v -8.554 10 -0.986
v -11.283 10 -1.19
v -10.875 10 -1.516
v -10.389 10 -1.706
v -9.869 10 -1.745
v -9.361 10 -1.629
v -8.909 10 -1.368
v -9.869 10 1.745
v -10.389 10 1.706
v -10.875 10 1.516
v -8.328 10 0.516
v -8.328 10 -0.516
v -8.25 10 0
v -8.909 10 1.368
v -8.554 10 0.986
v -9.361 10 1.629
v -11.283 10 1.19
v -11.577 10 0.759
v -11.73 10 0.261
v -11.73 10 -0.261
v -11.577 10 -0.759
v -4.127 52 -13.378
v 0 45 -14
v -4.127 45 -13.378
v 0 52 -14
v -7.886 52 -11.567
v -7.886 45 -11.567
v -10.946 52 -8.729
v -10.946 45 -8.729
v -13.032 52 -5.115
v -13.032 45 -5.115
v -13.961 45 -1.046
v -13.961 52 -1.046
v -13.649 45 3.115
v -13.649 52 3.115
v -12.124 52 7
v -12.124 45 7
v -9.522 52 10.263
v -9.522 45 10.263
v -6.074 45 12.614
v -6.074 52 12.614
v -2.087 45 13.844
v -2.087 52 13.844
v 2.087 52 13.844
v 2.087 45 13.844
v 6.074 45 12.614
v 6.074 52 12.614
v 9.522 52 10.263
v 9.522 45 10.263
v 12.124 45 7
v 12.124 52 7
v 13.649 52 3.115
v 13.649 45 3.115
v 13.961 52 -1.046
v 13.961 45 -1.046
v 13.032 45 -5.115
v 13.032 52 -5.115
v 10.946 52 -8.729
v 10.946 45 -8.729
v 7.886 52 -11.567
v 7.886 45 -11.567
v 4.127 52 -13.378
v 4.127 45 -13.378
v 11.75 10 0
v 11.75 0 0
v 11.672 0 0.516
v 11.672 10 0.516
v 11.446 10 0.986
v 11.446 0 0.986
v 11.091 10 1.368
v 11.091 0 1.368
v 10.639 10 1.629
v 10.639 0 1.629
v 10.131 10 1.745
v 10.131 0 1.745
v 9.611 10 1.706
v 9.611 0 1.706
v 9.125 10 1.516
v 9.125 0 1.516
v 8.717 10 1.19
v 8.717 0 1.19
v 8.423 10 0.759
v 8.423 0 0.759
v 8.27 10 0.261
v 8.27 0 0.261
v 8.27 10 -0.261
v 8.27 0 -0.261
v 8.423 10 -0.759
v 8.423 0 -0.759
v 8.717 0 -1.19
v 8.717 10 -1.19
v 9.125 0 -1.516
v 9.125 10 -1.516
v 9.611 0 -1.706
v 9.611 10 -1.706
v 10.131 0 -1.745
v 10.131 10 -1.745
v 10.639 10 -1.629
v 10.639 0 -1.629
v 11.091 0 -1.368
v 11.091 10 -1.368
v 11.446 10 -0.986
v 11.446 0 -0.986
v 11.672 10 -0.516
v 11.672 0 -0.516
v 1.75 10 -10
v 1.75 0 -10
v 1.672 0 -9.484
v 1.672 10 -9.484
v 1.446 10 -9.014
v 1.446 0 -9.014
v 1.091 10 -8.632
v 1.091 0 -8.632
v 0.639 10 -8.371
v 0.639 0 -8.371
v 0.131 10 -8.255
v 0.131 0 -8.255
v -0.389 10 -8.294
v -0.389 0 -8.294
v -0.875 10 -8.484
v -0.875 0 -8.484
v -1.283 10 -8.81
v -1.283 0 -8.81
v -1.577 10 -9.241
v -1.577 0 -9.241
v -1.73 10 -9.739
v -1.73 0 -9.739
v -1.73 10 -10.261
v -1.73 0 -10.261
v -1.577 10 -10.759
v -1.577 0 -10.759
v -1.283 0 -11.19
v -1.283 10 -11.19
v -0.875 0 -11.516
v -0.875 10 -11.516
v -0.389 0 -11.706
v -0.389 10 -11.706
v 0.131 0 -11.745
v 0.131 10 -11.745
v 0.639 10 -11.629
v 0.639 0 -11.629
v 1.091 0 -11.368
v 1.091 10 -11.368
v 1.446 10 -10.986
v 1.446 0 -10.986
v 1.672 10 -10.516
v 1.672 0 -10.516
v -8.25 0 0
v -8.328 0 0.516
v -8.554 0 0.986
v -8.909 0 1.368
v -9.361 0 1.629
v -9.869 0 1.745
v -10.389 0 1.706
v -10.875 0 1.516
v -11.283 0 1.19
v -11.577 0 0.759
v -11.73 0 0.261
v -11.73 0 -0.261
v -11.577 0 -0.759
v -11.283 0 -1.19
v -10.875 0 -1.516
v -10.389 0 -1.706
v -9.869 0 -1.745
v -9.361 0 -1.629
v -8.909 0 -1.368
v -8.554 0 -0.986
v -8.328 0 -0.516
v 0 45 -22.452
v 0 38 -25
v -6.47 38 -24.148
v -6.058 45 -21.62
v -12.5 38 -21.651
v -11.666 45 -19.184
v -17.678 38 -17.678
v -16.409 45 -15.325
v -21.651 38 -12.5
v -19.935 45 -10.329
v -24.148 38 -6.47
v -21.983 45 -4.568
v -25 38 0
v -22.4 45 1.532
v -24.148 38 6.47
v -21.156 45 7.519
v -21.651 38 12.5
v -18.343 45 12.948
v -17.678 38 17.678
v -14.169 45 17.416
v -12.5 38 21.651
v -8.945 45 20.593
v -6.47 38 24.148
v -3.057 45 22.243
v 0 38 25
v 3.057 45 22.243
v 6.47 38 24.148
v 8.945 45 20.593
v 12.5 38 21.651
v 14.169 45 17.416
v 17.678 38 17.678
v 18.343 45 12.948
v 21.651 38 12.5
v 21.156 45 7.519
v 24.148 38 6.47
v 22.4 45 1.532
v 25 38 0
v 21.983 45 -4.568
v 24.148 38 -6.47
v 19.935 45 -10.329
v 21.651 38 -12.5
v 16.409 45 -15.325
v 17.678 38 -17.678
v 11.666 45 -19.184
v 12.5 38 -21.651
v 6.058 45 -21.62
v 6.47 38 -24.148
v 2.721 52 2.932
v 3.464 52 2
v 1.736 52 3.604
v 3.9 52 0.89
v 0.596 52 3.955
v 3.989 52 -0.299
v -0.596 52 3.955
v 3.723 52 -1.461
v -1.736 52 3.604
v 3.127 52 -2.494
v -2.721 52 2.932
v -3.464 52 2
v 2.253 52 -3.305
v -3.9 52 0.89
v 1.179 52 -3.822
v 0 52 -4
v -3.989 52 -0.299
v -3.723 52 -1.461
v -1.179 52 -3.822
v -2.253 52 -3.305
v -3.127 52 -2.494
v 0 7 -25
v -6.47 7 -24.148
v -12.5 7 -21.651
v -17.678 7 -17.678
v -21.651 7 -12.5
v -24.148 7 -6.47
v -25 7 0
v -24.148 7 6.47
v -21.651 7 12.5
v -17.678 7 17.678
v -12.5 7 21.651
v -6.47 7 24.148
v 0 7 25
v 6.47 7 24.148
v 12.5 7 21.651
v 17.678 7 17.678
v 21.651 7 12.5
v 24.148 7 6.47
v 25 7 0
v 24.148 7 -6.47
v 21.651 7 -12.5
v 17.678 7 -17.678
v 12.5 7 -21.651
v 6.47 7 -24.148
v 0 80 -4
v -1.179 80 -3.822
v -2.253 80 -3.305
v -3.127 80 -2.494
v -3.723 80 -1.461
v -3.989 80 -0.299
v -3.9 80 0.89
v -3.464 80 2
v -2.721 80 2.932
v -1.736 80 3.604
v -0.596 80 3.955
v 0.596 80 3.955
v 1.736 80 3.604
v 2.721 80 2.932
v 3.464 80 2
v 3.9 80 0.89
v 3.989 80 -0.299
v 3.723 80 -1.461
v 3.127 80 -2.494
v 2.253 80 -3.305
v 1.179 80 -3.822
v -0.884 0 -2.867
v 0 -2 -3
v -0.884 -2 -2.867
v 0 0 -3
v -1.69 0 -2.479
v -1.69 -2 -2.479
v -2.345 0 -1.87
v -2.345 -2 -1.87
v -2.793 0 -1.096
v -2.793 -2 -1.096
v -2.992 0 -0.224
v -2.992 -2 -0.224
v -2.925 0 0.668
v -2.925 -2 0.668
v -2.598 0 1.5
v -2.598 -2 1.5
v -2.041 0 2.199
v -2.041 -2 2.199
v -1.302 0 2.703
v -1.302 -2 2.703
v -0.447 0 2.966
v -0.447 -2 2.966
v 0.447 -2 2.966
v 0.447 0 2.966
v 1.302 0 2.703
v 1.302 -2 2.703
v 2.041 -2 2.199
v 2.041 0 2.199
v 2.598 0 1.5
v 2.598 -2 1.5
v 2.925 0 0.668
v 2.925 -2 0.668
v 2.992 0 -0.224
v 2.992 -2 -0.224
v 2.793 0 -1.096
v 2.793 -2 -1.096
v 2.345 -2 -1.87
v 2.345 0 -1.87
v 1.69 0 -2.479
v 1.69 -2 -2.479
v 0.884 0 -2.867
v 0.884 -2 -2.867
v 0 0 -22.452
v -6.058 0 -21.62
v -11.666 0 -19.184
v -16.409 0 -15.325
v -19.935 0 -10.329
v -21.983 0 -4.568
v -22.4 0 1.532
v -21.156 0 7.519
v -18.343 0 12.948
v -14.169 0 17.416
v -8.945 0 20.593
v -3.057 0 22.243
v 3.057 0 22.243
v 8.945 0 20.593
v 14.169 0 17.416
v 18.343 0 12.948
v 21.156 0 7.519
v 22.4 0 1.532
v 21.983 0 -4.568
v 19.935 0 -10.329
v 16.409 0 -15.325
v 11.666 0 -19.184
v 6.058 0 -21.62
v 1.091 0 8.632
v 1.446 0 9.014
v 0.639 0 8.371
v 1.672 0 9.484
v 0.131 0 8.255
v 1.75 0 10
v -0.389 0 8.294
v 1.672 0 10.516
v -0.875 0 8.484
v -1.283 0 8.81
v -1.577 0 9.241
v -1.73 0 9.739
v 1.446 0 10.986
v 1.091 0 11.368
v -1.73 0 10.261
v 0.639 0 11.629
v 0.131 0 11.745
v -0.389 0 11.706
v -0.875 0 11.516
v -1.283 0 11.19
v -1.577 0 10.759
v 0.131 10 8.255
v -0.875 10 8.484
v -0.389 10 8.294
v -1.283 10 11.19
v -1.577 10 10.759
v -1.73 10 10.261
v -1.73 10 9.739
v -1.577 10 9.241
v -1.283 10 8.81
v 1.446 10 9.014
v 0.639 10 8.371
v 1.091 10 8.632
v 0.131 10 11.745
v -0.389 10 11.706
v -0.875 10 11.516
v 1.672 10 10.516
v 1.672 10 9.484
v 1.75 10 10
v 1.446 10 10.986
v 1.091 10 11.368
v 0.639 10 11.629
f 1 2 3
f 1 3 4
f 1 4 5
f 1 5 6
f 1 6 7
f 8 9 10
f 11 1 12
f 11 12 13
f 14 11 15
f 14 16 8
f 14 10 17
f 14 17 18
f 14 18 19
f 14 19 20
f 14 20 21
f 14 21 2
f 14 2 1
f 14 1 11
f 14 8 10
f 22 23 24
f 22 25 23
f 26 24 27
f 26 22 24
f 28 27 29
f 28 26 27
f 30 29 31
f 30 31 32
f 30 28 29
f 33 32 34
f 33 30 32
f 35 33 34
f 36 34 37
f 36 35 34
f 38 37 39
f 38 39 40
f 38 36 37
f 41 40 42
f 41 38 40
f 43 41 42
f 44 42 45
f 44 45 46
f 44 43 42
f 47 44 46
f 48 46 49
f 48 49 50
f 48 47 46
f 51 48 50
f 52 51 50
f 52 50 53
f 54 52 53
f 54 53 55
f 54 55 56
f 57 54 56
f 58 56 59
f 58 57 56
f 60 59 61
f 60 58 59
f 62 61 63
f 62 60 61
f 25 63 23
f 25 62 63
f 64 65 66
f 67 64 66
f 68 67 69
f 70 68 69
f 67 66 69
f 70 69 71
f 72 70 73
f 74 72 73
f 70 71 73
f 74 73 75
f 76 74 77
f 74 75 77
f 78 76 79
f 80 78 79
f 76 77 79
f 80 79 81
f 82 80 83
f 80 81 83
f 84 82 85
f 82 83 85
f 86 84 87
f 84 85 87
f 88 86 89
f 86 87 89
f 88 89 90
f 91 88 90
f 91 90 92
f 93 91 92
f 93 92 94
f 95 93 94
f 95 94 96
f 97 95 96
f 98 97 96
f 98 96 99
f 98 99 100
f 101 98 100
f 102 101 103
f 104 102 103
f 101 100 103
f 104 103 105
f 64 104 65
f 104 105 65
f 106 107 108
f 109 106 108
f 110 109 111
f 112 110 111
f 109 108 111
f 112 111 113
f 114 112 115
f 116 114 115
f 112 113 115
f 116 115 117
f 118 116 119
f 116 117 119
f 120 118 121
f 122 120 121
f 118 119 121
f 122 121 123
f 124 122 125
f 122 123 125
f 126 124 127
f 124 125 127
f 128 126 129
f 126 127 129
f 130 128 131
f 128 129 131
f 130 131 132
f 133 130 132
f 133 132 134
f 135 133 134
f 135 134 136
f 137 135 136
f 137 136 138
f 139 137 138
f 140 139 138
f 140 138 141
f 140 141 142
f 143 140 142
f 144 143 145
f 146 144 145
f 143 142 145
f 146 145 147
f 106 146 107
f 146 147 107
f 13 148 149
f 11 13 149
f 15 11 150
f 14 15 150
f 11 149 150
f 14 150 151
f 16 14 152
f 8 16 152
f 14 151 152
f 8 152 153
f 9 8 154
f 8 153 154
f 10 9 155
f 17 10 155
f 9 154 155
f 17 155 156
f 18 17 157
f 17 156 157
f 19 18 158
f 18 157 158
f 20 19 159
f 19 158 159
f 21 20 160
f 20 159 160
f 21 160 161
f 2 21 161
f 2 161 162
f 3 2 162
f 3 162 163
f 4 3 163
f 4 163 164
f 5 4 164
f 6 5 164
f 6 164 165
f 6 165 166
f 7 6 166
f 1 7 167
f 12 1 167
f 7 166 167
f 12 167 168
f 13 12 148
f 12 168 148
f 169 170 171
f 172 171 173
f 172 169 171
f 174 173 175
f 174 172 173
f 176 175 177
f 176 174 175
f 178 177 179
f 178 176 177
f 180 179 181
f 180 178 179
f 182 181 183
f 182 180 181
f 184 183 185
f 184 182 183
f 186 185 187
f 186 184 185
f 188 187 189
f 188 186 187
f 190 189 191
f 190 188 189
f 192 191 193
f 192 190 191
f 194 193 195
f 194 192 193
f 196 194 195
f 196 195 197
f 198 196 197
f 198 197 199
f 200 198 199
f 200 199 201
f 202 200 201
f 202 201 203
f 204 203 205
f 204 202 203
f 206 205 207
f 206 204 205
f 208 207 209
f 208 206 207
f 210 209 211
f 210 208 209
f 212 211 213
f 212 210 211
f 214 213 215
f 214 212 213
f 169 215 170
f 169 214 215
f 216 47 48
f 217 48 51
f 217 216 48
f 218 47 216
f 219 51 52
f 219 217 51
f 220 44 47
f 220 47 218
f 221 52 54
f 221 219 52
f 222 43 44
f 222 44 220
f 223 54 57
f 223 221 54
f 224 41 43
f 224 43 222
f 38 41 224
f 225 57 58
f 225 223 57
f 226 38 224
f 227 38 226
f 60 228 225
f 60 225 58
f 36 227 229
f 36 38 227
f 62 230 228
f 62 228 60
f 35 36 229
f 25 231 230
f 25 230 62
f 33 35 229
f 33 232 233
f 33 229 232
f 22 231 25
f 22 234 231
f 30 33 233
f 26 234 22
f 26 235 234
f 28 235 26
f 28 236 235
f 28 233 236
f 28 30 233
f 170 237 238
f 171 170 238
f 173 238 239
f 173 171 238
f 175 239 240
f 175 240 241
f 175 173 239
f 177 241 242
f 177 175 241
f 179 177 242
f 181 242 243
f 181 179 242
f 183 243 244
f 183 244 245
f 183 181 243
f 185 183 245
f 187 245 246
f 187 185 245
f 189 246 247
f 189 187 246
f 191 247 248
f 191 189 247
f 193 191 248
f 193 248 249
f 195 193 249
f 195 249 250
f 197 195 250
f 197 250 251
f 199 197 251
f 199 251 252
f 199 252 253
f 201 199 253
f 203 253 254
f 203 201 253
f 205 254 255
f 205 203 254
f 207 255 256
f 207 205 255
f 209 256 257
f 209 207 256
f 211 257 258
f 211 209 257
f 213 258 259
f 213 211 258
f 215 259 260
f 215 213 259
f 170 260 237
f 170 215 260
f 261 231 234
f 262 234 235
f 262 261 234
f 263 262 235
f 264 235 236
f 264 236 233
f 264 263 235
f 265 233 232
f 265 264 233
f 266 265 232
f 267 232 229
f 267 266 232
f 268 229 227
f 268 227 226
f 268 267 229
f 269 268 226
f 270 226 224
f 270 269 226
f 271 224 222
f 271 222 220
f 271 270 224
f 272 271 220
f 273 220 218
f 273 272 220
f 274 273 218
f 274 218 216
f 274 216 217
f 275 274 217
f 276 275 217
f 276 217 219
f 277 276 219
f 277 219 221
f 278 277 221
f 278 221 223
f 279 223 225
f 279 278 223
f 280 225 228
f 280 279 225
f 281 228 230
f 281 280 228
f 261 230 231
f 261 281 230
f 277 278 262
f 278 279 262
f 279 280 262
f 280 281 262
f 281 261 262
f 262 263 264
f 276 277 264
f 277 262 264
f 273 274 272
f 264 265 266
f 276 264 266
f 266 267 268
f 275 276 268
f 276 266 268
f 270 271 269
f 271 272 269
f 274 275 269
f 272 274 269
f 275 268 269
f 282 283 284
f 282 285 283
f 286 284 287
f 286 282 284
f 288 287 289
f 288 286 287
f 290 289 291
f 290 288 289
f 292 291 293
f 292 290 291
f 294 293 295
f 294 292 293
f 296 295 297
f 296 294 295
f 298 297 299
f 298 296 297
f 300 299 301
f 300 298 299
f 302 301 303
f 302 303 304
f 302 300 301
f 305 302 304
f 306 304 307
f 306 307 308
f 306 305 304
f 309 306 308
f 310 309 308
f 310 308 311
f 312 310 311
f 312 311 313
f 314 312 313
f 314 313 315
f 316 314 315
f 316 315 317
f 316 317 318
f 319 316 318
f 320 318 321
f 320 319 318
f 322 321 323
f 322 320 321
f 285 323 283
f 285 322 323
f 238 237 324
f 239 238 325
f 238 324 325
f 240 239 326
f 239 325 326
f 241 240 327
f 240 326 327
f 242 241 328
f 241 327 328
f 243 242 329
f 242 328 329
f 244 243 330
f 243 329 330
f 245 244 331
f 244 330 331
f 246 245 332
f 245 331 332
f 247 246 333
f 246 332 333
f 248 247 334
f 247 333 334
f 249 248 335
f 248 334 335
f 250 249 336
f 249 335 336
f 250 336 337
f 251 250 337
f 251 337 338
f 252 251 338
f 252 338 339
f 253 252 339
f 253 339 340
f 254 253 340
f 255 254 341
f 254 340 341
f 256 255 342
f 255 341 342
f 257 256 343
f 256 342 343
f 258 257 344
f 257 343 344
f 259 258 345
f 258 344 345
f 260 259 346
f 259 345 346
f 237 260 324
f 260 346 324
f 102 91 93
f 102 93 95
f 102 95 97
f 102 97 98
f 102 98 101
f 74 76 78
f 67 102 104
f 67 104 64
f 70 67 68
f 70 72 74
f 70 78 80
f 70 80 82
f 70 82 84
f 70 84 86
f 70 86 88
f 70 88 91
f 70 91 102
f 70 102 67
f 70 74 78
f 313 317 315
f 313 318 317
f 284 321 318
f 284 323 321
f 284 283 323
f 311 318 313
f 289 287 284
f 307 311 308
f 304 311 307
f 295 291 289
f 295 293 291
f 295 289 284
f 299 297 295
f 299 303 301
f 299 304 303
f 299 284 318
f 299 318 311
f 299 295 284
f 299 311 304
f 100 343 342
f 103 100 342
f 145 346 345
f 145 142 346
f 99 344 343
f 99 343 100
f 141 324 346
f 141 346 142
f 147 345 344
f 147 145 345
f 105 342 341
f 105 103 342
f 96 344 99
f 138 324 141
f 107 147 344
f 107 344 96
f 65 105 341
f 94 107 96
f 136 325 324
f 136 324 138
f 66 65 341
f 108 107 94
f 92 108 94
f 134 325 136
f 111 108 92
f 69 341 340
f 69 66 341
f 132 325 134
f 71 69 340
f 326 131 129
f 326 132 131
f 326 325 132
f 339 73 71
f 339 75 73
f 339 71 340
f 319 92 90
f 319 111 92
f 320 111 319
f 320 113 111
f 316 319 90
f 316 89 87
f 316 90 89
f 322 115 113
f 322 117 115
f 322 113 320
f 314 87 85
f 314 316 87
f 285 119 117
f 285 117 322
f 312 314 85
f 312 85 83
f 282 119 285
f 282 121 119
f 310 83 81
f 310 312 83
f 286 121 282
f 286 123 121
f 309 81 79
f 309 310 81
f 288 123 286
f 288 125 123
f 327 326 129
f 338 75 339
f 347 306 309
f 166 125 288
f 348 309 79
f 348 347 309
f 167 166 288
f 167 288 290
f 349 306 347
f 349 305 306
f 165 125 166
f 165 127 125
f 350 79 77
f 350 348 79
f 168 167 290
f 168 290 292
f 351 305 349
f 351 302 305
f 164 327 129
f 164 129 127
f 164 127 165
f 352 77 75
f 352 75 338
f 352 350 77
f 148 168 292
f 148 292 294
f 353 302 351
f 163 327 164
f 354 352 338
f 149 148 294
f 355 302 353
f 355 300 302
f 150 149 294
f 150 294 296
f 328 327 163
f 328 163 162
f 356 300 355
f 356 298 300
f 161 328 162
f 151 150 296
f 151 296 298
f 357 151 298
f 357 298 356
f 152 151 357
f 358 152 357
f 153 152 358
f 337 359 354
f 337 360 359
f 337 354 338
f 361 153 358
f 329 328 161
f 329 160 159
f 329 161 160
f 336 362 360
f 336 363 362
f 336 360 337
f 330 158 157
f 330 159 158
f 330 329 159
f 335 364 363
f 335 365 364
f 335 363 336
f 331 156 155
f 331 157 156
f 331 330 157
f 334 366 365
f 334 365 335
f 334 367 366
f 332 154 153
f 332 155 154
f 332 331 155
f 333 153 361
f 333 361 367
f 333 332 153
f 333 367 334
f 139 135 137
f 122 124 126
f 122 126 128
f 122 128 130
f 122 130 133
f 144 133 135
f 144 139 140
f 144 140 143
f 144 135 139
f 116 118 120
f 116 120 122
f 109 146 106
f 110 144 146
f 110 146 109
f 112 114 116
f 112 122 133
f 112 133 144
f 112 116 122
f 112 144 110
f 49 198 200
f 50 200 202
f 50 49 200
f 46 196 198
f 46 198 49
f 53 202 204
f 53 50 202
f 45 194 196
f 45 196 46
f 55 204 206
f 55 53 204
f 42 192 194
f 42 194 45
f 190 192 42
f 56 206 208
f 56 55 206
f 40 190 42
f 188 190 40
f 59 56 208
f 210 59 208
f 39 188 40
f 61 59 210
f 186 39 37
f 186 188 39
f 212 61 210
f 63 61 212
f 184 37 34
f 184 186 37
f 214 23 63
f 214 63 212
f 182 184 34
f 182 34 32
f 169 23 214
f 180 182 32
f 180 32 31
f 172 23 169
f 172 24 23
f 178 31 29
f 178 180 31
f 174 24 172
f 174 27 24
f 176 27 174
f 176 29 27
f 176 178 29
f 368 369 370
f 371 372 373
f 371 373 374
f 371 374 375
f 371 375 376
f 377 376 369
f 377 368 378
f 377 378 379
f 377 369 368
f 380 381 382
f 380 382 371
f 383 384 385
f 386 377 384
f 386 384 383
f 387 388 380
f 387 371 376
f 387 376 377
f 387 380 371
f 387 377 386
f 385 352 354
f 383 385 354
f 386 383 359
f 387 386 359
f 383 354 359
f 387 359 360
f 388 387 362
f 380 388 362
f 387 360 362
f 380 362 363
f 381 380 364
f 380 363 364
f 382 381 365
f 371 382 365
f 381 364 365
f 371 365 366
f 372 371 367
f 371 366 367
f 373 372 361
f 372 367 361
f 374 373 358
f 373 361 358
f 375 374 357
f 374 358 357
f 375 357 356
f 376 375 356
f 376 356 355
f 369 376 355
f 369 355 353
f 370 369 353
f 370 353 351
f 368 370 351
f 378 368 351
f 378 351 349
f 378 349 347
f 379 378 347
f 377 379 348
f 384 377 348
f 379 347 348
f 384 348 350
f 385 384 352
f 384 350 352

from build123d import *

# Parameters (mm, degrees)
SKETCH1_W          = 3
SKETCH1_H          = 2
SKETCH1_W_2        = 4
SKETCH1_H_2        = 7
SKETCH1_W_3        = 10
SKETCH1_H_3        = 28
CHAMFER1_SIZE      = 7
CHAMFER1_SIZE2     = 2.54779164
CHAMFER2_SIZE      = 7
CHAMFER2_SIZE2     = 2.54779164
SKETCH2_R          = 1.75
CUT_EXTRUDE1_DEPTH = 10


with BuildPart() as part:
    # Sketch1 → Revolve1 (revolve)
    with BuildSketch(Plane.XY, mode=Mode.PRIVATE) as revolve1_sk:
        Polygon((0, 45), (0, 0), (3, 0), (25, 0), (25, 45), (14, 45), (4, 45), align=None)
        with Locations((1.5, -1)):
            Rectangle(SKETCH1_W, SKETCH1_H)
        with Locations((2, 48.5)):
            Rectangle(SKETCH1_W_2, SKETCH1_H_2)
        with Locations((9, 48.5)):
            Rectangle(SKETCH1_W_3, SKETCH1_H_2)
        with Locations((2, 66)):
            Rectangle(SKETCH1_W_2, SKETCH1_H_3)
    revolve(revolve1_sk.sketch.rotate(Axis((0, 45, 0), (0, 1, 0)), 90), axis=Axis((0, 45, 0), (0, 1, 0)))

    # Chamfer1
    chamfer1_edges = [part.edges().sort_by_distance(p)[0] for p in [
        (0, 0, 25),
    ]]
    chamfer1_side = [part.faces().sort_by_distance(p)[0] for p in [
        (0, 22.5, 25),
    ]]
    chamfer(chamfer1_edges, length=CHAMFER1_SIZE, length2=CHAMFER1_SIZE2, reference=chamfer1_side[0])

    # Chamfer2
    chamfer2_edges = [part.edges().sort_by_distance(p)[0] for p in [
        (0, 45, 25),
    ]]
    chamfer2_side = [part.faces().sort_by_distance(p)[0] for p in [
        (0, 26, 25),
    ]]
    chamfer(chamfer2_edges, length=CHAMFER2_SIZE, length2=CHAMFER2_SIZE2, reference=chamfer2_side[0])

    # Sketch2 → Cut-Extrude1 (cut)
    with BuildSketch(Plane.XZ):
        with Locations((0, 10)):
            Circle(SKETCH2_R)
        with Locations((10, 0)):
            Circle(SKETCH2_R)
        with Locations((0, -10)):
            Circle(SKETCH2_R)
        with Locations((-10, 0)):
            Circle(SKETCH2_R)
    extrude(amount=-CUT_EXTRUDE1_DEPTH, mode=Mode.SUBTRACT)


solid = part.part
